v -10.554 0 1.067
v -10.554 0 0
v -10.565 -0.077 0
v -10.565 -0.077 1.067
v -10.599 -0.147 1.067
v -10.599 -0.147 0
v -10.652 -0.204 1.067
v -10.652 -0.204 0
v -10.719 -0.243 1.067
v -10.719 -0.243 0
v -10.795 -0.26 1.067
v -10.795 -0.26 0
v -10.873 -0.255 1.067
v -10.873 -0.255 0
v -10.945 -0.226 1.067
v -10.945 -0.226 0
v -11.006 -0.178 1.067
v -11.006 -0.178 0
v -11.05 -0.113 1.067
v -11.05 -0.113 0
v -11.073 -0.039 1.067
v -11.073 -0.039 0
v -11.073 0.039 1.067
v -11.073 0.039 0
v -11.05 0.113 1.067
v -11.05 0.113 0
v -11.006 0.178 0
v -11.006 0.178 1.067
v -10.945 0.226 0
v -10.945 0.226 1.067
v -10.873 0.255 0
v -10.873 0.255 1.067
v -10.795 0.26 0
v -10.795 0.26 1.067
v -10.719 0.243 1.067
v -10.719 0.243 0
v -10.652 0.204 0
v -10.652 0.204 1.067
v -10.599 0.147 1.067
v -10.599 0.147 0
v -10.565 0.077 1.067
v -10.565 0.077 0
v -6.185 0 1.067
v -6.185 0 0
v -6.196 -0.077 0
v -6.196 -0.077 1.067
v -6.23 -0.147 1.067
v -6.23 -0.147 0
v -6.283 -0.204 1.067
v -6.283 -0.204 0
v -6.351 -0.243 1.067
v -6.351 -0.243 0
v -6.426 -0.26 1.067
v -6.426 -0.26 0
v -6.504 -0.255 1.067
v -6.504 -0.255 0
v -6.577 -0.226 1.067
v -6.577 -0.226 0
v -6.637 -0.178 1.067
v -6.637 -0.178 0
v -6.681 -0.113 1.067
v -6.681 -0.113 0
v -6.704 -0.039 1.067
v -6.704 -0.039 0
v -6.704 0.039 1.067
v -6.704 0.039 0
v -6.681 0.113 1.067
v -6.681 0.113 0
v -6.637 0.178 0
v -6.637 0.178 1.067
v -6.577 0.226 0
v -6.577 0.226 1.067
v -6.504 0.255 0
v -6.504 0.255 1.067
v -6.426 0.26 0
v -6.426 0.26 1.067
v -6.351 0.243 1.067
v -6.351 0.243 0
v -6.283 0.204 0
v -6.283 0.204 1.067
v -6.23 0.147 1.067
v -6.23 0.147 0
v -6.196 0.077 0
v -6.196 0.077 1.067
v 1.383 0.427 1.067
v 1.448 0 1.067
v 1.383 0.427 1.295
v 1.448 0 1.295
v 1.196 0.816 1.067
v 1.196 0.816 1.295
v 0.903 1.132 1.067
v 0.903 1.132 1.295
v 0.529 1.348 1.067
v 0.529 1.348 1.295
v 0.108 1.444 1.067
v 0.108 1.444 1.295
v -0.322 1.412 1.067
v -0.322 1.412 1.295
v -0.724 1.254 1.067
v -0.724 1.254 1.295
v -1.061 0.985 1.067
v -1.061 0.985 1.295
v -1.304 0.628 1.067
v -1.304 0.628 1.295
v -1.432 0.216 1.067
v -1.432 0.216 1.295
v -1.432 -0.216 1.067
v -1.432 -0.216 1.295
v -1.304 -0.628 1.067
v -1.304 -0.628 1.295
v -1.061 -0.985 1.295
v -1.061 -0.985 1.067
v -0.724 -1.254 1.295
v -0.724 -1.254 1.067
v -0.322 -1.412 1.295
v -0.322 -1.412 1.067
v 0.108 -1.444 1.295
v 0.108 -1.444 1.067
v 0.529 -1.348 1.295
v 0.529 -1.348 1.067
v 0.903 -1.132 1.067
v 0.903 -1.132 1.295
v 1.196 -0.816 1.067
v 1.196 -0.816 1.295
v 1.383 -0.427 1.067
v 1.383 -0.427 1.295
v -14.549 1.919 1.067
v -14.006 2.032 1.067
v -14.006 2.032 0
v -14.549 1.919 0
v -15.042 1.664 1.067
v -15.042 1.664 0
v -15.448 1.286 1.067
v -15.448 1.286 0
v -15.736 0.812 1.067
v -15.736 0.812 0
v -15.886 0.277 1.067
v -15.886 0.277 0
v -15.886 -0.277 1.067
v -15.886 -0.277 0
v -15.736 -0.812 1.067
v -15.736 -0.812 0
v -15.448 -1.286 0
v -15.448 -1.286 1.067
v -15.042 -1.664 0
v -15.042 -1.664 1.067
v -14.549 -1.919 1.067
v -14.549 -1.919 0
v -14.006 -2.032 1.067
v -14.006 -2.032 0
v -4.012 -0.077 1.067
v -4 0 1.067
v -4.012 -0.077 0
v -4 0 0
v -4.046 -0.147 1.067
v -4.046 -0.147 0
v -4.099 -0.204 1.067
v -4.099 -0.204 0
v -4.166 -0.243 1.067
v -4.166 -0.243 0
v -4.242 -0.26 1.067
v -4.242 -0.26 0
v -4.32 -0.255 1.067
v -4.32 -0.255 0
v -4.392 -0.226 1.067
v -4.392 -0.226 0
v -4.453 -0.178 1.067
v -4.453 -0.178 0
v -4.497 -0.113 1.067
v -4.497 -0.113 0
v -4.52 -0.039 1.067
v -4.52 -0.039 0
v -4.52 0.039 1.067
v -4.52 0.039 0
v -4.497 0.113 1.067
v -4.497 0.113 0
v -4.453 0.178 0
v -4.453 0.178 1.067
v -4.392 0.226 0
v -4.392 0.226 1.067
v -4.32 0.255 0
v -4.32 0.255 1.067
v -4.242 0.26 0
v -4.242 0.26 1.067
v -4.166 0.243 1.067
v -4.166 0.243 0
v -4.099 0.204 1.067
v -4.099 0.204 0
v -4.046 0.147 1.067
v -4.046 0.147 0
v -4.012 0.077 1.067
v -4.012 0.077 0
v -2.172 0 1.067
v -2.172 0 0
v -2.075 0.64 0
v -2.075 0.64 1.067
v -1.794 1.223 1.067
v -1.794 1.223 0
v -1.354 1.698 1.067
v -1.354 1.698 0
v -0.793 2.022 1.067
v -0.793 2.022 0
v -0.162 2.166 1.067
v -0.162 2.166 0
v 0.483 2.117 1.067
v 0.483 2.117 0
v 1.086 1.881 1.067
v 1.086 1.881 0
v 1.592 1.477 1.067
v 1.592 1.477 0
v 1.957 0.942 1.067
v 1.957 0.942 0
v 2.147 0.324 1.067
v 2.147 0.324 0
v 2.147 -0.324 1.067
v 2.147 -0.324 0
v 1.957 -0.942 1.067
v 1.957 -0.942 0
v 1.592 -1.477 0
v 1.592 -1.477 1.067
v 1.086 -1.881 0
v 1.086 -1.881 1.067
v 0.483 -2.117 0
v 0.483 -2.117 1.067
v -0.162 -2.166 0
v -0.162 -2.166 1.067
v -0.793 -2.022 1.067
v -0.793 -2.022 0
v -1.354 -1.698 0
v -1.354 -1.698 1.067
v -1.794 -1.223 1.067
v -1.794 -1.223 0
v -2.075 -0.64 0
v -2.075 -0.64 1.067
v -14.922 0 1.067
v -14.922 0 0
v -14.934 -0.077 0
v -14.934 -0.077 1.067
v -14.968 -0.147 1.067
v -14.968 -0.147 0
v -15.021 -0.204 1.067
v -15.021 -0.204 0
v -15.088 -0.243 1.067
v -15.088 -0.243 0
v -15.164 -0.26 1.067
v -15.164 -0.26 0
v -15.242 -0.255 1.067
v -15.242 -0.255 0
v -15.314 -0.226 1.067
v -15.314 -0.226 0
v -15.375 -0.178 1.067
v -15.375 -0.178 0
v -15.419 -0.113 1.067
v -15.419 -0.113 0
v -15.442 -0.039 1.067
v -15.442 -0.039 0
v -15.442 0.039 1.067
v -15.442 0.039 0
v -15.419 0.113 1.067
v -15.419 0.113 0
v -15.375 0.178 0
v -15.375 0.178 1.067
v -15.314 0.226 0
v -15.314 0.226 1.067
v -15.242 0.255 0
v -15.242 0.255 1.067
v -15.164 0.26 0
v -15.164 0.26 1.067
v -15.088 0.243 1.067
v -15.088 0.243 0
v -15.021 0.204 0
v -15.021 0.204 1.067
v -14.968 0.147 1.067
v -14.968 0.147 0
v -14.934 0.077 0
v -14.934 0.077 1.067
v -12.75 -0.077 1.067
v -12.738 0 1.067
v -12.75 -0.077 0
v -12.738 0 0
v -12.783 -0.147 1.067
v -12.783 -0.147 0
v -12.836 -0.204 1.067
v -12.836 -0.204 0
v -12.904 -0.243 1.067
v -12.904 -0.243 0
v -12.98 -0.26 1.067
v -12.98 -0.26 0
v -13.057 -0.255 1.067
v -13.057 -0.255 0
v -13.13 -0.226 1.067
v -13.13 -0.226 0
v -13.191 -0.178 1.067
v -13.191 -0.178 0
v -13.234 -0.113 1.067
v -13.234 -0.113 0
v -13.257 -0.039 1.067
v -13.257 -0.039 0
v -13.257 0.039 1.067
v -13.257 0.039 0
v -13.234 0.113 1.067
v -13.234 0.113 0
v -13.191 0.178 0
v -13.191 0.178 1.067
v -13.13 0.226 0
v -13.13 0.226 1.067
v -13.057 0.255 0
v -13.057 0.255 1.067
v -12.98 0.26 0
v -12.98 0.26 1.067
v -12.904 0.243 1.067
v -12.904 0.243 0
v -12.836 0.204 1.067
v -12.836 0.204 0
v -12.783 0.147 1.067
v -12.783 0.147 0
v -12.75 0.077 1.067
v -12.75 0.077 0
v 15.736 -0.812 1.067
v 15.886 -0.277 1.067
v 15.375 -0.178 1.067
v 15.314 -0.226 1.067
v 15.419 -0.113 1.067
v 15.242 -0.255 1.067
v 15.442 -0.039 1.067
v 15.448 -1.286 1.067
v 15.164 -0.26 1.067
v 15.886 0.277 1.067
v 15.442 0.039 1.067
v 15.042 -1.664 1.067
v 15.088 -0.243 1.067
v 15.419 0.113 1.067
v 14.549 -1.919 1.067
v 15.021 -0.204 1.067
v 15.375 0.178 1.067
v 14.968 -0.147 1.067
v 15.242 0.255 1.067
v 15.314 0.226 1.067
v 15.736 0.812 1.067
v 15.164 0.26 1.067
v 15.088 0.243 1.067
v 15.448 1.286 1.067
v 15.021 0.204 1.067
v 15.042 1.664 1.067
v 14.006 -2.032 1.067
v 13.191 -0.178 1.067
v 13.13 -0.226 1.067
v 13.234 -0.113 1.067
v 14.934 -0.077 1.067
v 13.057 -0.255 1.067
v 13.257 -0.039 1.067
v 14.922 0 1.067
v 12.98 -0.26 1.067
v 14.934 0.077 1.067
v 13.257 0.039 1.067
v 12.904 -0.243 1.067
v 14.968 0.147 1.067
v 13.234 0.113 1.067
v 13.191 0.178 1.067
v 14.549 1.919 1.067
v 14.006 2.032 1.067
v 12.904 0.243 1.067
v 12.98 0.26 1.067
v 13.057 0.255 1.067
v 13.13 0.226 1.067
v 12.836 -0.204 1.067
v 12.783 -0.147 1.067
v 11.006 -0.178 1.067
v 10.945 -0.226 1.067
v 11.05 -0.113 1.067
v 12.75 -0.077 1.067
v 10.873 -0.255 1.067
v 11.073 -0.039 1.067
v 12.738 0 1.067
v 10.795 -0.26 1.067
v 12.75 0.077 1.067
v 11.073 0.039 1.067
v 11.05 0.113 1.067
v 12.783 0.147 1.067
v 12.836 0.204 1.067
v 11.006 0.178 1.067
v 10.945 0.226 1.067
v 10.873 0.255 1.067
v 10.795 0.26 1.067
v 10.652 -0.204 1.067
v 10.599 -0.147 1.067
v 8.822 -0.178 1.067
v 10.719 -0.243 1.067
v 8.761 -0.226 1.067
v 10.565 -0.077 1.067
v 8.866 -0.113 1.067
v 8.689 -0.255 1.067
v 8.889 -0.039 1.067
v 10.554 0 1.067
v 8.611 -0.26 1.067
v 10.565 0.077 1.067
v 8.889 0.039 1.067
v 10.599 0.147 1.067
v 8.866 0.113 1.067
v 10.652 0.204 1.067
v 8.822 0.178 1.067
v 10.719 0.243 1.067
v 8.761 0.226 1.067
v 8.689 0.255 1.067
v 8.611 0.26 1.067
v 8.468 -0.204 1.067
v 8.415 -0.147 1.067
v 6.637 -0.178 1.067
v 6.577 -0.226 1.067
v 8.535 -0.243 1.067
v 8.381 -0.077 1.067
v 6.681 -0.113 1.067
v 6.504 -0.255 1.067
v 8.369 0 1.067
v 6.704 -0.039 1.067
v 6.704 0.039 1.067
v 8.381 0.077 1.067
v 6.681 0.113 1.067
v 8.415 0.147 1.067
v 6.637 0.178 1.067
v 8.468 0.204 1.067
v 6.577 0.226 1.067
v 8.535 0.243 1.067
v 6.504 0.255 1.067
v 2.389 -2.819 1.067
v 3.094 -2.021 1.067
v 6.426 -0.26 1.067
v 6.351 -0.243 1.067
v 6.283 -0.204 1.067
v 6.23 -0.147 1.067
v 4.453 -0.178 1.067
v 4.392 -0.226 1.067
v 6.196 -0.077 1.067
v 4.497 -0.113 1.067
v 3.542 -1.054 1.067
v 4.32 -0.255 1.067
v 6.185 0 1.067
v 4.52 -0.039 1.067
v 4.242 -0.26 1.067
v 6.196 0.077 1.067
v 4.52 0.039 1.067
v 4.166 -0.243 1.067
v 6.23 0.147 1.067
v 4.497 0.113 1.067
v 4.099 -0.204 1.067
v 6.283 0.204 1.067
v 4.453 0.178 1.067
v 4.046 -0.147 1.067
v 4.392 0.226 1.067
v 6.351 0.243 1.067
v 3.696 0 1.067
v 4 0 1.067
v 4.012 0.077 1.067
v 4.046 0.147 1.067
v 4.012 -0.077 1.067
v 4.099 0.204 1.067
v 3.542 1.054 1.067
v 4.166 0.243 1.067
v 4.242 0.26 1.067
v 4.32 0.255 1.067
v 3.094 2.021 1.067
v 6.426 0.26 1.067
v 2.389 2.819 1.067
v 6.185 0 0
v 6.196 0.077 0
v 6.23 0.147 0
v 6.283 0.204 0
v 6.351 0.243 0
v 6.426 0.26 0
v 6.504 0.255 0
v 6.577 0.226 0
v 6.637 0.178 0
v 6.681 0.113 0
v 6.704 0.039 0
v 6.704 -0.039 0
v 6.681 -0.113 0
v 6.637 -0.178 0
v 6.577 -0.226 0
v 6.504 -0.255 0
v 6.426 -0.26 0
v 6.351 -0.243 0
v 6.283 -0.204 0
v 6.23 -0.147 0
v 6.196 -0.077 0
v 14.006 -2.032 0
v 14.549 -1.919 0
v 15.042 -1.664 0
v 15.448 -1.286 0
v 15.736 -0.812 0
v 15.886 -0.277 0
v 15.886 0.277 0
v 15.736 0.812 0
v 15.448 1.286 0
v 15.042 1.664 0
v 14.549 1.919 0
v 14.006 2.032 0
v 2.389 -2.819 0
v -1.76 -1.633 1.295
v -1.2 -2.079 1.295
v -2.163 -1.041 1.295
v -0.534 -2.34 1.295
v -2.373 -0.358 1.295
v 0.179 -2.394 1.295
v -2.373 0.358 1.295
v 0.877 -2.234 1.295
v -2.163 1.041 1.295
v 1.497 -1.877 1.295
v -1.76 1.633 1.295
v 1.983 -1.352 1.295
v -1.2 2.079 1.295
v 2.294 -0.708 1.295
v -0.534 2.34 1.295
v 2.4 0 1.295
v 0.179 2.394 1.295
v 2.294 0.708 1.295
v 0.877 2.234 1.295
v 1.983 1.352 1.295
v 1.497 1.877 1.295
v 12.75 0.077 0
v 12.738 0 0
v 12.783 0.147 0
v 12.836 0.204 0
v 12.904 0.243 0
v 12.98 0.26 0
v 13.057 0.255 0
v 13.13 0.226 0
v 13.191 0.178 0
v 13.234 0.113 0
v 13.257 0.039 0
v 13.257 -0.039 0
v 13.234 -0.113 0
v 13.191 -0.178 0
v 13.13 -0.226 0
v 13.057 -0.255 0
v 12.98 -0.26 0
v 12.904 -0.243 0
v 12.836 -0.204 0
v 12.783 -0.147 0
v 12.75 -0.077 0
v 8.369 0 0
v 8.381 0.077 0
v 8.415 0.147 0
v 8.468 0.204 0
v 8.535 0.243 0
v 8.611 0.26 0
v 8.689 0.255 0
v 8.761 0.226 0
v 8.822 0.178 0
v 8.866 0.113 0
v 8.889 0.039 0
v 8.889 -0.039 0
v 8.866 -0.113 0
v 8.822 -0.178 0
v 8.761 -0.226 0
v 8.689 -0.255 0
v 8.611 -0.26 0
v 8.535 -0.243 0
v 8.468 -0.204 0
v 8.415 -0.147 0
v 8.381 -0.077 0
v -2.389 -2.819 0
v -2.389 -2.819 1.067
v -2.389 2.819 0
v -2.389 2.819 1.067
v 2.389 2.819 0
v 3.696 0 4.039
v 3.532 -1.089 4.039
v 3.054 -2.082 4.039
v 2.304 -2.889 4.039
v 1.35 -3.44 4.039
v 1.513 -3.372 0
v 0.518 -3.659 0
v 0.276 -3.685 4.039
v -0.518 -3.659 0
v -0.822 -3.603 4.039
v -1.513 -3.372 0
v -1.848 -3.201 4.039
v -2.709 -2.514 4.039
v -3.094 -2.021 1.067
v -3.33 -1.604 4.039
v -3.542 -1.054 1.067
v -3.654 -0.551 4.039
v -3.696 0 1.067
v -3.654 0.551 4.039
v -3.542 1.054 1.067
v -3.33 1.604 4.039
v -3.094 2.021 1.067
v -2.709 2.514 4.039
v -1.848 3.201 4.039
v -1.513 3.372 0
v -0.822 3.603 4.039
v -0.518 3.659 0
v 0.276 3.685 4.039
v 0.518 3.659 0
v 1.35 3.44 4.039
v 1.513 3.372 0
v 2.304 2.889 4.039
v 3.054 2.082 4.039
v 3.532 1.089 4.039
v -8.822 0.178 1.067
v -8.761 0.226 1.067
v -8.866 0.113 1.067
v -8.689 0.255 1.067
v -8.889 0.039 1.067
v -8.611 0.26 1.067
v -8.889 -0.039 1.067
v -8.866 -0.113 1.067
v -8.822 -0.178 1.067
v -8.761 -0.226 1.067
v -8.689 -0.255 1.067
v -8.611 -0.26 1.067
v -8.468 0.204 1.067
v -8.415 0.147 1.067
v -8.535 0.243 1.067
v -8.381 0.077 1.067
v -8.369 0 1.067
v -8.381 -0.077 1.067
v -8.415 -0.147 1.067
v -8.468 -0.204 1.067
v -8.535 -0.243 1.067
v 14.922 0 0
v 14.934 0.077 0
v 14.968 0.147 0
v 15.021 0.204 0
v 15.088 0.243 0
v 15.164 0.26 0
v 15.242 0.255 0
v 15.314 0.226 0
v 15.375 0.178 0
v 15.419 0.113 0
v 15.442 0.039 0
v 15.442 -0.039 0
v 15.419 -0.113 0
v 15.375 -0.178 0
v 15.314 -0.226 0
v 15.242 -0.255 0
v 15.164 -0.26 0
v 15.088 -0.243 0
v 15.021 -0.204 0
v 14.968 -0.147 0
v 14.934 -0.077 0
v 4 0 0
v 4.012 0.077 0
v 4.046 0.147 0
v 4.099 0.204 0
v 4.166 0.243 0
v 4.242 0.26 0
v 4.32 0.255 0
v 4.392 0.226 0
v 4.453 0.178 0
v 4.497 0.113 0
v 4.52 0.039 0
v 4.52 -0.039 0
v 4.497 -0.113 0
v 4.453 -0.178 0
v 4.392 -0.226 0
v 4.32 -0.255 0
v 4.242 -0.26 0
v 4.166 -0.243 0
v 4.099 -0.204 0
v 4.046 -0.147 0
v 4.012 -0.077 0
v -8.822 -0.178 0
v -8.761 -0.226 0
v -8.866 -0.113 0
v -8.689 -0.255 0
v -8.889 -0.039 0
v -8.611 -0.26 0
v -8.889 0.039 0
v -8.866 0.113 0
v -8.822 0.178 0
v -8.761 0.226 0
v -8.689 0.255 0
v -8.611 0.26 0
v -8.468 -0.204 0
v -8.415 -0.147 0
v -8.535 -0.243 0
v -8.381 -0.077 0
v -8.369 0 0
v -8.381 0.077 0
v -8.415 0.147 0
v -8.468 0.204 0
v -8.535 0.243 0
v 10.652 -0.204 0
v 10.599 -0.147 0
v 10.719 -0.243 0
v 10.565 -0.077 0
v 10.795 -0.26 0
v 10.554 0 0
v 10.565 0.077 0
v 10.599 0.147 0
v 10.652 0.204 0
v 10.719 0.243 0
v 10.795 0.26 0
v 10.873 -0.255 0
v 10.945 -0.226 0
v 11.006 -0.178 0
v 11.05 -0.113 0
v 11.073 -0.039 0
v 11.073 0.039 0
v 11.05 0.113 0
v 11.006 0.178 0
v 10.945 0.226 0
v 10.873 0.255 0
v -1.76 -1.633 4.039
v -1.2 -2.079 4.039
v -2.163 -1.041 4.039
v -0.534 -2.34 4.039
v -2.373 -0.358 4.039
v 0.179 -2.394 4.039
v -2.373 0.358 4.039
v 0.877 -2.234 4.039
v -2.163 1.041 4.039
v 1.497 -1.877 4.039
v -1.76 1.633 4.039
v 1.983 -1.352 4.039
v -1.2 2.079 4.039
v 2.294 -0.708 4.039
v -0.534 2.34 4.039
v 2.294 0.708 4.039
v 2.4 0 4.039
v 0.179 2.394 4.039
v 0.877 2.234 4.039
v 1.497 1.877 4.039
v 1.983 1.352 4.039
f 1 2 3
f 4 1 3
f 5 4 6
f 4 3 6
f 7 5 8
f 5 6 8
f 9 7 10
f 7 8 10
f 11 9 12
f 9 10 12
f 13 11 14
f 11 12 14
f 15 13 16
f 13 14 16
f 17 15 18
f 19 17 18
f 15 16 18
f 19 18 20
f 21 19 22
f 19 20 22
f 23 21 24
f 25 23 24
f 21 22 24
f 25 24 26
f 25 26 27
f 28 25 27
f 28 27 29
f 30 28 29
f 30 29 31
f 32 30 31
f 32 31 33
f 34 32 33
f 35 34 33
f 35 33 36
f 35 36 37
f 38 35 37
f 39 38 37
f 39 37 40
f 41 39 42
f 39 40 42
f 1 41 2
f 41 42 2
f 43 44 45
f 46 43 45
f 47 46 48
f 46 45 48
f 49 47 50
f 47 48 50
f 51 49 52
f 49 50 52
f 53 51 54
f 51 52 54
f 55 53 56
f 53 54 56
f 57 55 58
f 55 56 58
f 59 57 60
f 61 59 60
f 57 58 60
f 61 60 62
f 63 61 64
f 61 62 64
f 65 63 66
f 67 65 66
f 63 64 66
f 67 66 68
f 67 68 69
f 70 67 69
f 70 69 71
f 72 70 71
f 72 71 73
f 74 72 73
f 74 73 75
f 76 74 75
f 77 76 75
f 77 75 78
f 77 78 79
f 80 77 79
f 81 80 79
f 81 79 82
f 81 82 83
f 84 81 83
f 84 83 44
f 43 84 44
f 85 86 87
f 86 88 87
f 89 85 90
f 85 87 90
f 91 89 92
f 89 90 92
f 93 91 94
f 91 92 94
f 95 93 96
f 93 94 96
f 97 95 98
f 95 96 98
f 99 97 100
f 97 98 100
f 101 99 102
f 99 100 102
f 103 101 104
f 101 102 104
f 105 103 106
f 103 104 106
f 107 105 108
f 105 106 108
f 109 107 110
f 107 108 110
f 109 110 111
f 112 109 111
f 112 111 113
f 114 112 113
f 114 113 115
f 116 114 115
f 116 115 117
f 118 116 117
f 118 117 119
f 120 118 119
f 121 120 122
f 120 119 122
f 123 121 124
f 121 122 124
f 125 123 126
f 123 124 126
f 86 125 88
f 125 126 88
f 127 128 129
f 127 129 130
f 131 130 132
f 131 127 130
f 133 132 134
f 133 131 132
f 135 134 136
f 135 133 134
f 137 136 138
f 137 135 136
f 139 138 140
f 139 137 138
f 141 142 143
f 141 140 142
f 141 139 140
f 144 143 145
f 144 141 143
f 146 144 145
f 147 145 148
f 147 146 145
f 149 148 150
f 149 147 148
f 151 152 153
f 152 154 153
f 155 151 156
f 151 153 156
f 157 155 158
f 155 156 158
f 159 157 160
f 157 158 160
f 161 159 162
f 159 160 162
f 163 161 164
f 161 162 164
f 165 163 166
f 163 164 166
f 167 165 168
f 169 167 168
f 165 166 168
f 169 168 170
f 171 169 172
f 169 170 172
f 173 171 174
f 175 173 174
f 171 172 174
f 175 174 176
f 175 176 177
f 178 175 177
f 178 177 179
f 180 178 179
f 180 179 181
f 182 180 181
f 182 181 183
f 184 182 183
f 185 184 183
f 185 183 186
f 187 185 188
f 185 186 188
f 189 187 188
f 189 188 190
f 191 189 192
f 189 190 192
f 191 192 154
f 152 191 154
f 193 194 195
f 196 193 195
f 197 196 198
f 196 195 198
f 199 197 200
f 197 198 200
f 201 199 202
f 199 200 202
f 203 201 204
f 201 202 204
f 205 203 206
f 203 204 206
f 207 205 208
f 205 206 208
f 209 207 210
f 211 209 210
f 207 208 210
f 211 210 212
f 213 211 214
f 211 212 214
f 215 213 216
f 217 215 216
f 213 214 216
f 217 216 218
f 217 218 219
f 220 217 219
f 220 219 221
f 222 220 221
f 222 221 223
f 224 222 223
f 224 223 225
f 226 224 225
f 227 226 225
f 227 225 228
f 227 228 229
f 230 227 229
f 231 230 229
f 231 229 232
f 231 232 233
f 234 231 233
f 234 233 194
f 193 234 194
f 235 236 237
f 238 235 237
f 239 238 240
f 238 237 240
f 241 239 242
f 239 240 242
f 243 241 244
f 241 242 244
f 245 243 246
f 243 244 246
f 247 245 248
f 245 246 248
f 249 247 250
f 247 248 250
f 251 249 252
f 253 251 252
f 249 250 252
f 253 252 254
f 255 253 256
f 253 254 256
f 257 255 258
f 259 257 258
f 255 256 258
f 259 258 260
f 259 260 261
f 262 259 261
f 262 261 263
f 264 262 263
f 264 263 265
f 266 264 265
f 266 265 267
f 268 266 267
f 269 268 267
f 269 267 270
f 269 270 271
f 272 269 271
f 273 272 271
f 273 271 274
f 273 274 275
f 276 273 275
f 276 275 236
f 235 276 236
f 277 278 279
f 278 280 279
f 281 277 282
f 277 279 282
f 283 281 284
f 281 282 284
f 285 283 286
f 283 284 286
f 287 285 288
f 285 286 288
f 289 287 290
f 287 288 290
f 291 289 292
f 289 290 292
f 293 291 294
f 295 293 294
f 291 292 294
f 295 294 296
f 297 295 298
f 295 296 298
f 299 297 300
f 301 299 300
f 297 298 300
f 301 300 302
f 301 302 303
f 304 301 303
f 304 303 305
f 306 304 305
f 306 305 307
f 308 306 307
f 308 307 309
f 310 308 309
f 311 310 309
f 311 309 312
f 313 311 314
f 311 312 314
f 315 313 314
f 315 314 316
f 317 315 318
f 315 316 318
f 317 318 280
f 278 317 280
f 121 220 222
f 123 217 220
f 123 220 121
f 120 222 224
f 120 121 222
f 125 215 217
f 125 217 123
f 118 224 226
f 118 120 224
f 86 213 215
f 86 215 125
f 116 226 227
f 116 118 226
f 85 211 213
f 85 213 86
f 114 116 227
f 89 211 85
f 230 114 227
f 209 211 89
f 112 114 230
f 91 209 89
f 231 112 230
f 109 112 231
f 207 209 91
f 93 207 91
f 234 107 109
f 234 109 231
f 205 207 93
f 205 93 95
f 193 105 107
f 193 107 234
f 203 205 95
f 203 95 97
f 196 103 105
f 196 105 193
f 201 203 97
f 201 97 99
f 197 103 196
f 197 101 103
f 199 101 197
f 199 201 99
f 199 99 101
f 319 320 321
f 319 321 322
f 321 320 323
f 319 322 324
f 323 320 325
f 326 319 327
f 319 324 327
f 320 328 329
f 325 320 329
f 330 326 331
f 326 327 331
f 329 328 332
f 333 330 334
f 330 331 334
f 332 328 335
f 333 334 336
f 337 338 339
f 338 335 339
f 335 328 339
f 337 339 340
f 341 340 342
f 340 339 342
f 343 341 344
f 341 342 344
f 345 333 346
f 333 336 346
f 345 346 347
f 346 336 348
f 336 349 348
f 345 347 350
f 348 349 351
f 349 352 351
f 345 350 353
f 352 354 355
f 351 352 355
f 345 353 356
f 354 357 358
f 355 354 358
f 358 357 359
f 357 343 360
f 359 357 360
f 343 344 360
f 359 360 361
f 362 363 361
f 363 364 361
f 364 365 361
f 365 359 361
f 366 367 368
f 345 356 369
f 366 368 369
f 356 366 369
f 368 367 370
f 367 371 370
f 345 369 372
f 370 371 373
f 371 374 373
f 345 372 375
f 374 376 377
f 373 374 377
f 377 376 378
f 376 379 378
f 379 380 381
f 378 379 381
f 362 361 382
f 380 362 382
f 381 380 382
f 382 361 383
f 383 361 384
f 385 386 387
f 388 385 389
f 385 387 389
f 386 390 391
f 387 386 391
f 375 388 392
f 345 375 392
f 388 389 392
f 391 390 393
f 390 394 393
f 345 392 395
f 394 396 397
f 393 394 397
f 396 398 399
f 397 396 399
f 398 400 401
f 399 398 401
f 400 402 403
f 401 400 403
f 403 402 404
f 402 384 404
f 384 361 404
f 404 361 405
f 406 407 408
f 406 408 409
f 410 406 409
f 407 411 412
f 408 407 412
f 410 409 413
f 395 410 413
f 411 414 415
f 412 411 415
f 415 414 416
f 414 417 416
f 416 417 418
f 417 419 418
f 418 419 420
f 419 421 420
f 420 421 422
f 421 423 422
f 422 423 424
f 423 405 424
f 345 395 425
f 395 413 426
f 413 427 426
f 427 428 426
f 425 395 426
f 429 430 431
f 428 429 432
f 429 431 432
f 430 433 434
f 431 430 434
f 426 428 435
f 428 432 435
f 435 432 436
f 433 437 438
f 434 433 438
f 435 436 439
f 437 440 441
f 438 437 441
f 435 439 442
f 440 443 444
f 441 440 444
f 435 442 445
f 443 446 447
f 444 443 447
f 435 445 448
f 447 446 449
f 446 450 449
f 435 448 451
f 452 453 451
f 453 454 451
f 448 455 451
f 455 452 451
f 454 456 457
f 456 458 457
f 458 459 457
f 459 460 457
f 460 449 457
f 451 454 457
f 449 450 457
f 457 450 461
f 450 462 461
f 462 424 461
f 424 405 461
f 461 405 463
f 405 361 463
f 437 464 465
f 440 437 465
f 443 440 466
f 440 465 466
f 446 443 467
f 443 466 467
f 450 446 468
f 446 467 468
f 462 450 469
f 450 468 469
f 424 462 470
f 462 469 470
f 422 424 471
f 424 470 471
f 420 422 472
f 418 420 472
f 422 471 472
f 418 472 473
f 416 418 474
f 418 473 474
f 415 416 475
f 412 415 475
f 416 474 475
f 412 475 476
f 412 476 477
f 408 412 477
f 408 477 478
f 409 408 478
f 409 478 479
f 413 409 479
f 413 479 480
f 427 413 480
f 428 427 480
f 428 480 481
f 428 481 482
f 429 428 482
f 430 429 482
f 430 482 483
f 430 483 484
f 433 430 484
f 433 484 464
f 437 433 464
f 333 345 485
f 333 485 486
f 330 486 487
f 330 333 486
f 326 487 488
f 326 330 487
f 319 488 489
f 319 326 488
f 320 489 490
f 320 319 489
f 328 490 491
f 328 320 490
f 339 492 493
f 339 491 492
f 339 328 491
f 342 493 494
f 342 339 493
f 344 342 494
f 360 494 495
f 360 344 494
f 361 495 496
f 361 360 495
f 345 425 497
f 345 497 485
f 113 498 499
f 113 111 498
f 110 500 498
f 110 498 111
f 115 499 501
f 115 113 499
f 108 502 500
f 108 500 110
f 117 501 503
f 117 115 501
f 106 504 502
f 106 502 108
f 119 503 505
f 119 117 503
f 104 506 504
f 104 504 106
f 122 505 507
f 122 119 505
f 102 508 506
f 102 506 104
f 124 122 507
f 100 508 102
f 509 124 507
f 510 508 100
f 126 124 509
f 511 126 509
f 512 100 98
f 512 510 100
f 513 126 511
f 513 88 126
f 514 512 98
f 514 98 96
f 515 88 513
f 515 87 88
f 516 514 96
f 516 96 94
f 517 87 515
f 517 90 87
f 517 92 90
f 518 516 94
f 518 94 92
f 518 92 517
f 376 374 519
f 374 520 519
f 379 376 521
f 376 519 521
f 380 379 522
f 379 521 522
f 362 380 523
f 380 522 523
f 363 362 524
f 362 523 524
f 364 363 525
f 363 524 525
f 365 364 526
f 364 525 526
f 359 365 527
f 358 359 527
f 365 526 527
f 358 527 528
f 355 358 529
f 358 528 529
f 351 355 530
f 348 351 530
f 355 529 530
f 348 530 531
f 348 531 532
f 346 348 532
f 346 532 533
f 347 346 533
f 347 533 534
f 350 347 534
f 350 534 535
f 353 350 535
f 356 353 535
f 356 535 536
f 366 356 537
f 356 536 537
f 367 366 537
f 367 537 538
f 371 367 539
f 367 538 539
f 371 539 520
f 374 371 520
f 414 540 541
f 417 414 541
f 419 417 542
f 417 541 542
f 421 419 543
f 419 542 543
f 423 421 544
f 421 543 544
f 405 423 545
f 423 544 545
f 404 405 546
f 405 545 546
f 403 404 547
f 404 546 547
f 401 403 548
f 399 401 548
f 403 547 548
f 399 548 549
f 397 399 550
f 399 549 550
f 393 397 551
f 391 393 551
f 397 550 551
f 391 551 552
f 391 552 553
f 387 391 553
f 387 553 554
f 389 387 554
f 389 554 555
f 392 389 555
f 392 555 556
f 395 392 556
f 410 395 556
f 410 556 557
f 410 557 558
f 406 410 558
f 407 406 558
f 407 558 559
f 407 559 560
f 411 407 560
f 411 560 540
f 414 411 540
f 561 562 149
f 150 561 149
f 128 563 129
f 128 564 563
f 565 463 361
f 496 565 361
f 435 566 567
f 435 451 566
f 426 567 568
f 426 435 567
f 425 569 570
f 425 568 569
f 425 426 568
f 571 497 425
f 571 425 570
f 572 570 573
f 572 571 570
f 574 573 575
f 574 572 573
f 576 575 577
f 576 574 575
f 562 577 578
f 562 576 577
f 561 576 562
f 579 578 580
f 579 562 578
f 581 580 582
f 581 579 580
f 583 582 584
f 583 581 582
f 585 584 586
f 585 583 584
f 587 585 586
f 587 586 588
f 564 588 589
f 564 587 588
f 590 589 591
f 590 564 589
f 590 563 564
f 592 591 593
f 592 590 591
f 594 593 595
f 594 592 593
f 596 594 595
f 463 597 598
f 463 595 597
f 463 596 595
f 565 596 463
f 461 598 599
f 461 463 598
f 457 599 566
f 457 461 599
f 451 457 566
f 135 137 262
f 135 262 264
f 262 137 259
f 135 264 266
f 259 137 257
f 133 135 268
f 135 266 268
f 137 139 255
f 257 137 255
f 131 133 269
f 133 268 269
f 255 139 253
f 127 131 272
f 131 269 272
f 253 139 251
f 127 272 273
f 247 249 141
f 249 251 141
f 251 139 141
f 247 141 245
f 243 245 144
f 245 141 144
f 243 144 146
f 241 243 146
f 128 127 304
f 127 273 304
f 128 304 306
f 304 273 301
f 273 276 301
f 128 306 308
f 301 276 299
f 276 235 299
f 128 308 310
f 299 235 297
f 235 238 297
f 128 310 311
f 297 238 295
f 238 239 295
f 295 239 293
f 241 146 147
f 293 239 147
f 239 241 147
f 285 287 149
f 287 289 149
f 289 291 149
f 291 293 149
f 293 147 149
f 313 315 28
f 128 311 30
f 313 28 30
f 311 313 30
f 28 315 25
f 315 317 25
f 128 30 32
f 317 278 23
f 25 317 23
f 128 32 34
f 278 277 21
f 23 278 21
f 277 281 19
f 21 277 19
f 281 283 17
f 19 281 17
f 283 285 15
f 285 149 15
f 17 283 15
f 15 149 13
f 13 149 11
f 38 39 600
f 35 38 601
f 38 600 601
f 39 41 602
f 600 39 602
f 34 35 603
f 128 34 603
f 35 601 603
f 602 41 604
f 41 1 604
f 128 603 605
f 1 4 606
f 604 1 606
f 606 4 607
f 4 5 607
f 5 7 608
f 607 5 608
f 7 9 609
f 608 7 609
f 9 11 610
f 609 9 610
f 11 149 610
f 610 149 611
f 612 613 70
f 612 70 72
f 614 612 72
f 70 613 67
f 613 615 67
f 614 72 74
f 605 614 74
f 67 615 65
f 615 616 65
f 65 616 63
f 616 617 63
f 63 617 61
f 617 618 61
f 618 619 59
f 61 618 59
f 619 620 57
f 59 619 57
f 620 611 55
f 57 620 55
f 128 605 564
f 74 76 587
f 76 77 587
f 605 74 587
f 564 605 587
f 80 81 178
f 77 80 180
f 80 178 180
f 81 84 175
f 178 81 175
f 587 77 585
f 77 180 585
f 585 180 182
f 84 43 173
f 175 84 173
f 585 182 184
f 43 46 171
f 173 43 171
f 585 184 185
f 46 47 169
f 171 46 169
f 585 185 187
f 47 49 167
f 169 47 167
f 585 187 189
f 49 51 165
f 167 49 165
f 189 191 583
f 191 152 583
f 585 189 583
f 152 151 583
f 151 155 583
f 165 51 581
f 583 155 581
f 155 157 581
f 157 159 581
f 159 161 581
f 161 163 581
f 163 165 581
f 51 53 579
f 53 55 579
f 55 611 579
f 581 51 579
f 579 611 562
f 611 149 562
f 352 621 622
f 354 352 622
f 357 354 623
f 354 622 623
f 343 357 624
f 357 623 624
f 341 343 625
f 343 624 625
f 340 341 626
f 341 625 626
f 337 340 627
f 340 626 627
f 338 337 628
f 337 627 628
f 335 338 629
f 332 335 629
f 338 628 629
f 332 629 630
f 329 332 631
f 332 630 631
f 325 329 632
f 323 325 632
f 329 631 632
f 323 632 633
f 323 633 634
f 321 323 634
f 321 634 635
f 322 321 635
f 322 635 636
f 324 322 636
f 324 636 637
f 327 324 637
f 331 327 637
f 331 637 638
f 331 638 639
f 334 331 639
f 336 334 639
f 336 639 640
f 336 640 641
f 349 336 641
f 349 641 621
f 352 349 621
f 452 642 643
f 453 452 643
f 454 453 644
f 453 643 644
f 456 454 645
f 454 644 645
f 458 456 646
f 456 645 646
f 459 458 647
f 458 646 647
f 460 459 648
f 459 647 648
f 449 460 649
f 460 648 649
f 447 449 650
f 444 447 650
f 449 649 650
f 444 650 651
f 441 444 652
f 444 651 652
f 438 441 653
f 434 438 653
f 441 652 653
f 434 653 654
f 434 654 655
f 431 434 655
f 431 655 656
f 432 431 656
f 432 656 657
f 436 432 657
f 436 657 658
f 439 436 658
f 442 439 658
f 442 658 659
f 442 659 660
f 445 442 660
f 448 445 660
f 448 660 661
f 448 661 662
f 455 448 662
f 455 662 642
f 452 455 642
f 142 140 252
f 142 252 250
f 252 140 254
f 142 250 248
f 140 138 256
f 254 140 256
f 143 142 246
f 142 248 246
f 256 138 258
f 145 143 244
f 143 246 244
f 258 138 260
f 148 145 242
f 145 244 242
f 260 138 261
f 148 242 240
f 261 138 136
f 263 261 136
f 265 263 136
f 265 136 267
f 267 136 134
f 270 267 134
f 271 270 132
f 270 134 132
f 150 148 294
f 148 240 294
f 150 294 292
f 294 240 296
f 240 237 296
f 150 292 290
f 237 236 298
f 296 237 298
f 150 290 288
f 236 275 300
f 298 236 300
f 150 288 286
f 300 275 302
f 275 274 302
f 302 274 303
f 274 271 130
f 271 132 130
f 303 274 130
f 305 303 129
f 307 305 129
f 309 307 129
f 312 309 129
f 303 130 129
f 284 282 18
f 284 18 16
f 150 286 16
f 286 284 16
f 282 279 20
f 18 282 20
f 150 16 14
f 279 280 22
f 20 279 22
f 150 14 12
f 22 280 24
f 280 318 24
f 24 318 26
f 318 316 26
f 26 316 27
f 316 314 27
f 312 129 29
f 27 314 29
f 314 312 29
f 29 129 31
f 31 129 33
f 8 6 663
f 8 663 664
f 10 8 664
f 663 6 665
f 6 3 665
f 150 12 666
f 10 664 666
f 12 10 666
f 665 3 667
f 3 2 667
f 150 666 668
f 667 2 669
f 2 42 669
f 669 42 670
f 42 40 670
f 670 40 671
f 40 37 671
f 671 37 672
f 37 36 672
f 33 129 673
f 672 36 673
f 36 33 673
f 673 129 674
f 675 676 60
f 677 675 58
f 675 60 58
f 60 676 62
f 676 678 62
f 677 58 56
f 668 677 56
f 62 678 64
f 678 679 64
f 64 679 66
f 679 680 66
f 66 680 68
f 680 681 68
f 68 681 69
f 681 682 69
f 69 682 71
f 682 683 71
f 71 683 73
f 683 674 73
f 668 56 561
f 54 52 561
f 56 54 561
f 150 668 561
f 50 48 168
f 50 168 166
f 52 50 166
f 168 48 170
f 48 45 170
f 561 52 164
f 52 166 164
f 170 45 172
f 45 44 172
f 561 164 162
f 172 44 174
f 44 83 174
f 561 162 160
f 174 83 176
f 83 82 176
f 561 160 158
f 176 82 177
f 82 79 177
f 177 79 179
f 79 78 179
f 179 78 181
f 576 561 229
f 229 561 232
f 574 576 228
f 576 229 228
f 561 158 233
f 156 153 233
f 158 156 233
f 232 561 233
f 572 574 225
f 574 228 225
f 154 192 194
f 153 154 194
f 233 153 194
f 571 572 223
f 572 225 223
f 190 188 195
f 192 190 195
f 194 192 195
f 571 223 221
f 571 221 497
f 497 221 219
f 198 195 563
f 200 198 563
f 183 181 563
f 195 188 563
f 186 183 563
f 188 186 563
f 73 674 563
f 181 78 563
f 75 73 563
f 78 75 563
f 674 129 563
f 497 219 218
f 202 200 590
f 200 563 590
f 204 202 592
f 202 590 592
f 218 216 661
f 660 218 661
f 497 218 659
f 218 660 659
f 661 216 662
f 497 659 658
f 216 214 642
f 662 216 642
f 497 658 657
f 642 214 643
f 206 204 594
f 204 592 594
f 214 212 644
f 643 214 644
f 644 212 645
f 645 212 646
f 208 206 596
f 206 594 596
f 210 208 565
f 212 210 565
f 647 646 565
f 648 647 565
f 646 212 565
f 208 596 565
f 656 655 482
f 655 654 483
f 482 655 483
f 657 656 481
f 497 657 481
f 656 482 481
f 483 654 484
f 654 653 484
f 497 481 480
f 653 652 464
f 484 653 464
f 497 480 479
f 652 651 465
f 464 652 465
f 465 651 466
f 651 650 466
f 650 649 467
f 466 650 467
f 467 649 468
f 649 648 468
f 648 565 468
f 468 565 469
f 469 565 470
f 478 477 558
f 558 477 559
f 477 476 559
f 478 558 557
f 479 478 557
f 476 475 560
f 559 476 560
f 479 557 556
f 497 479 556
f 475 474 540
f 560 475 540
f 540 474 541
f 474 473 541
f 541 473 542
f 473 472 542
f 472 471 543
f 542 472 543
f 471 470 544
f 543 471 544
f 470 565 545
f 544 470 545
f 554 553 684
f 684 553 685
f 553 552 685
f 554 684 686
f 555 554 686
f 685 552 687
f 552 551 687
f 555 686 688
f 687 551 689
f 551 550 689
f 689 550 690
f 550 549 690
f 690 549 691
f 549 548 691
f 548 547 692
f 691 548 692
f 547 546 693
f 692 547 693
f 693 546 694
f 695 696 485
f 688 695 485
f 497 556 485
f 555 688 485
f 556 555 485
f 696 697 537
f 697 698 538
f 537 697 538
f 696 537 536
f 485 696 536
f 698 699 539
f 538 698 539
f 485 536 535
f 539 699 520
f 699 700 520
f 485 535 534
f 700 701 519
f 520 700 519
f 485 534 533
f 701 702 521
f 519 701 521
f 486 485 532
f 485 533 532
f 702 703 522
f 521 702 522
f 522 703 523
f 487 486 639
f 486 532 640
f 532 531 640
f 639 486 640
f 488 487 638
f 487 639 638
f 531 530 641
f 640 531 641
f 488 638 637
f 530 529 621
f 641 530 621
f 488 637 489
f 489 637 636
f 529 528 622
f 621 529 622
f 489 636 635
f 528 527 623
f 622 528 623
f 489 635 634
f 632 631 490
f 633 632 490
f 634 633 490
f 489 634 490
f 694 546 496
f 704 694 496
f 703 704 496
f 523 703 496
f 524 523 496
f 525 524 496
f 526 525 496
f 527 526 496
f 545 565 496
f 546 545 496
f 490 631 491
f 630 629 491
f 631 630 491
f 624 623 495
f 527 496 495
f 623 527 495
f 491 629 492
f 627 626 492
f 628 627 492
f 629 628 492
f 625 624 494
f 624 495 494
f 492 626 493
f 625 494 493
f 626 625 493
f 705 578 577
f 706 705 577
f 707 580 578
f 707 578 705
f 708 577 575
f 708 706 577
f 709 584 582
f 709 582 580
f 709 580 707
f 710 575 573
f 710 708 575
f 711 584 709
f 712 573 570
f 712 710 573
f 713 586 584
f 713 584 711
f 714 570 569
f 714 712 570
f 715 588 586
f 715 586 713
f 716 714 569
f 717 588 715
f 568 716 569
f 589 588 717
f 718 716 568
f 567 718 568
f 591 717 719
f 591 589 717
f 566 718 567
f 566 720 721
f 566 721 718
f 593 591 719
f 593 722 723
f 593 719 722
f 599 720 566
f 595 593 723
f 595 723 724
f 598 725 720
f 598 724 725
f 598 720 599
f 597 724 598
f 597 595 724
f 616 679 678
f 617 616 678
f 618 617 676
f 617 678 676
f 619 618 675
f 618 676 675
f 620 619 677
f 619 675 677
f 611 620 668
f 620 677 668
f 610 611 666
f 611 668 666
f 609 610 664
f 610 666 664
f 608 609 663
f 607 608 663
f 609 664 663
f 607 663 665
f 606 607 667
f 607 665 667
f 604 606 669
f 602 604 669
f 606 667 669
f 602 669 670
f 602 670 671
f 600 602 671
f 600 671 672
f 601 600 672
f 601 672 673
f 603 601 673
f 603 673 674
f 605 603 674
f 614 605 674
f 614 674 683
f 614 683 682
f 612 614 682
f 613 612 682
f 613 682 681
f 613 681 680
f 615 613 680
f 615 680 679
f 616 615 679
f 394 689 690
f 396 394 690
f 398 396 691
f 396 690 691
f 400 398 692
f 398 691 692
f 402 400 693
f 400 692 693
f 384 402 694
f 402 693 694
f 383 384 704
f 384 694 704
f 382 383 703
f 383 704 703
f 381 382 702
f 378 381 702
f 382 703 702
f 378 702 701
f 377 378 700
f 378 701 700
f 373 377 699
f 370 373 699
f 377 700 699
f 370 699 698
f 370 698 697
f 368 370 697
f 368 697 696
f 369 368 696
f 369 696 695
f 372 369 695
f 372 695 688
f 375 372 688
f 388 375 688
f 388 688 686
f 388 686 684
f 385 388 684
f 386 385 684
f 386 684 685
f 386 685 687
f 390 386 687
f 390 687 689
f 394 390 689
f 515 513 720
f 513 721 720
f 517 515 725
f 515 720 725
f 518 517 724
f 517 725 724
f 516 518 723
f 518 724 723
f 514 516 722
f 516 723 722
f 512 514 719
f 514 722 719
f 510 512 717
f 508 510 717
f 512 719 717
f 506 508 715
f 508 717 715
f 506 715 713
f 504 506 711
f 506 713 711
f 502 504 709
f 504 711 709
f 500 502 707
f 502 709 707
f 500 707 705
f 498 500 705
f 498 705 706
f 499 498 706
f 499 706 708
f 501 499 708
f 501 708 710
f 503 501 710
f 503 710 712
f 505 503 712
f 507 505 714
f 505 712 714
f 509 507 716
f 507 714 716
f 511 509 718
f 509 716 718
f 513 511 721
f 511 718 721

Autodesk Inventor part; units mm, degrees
ref_plane "YZ Plane" through (0, 0, 0) normal (1, 0, 0) x (0, 1, 0)
ref_plane "XZ Plane" through (0, 0, 0) normal (0, 1, 0) x (-1, 0, 0)
ref_plane "XY Plane" through (0, 0, 0) normal (0, 0, 1) x (1, 0, 0)
sketch "Sketch1" plane through (0, 0, 0) normal (0, 0, 1) x (1, 0, 0)
  circle A0 centre (0, 0) radius 3.6957
  dimension "d0" = 7.3914
extrude "Extrusion1" add sketch "Sketch1" along normal blind 4.0386
sketch "Sketch2" plane through (0, 0, 4.0386) normal (0, 0, 1) x (1, 0, 0)
  circle A0 centre (0, 0) radius 3.6957 projected
  circle A1 centre (0, 0) radius 2.4003
  dimension "d3" = 1.2954
extrude "Extrusion2" cut sketch "Sketch2" against normal blind 2.7432 contours A1
sketch "Sketch3" plane through (0, 0, 0) normal (0, 0, -1) x (-1, 0, 0)
  circle A0 centre (0, 0) radius 3.6957 projected
  circle A1 centre (0, 0) radius 2.1717
  dimension "d6" = 1.524
extrude "Extrusion3" cut sketch "Sketch3" against normal blind 1.0668 contours A1
sketch "Sketch4" plane through (0, 0, 1.2954) normal (0, 0, 1) x (1, 0, 0)
  circle A0 centre (0, 0) radius 2.4003 projected
  circle A1 centre (0, 0) radius 1.4478
  dimension "d9" = 2.8956
extrude "Extrusion4" cut sketch "Sketch4" against normal through all contours A1
ref_plane "Work Plane1" through (0, 0, 0.5334) normal (0, 0, -1) x (-1, 0, 0)
sketch "Sketch5" plane through (0, 0, 0.5334) normal (0, 0, -1) x (-1, 0, 0)
  circle A0 centre (0, 0) radius 3.6957 projected
  line L0 (-2.3894, 2.8194) -> (-14.0061, 2.032)
  line L1 (-2.3894, -2.8194) -> (-14.0061, -2.032)
  arc A1 (-14.0061, 2.032) -> (-14.0061, -2.032) centre (-13.8684, 0) ccw
  circle A2 centre (0, 0) radius 2.4003 projected
  line L2 (2.3894, 2.8194) -> (14.0061, 2.032)
  arc A3 (14.0061, -2.032) -> (14.0061, 2.032) centre (13.8684, 0) ccw
  line L3 (2.3894, -2.8194) -> (14.0061, -2.032)
  dimension "d12" = 5.6388
  dimension "d13" = 4.064
  dimension "d15" = 13.8684
  dimension "d28" = 360
extrude "Extrusion5" add sketch "Sketch5" along normal mid plane 1.0668 contours A0 L1 A1 L0
sketch "Sketch6" plane through (0, 0, 0) normal (0, 0, -1) x (-1, 0, 0)
  circle A0 centre (0, 0) radius 2.1717 projected
  circle A1 centre (-15.1836, 0) radius 0.2611
  circle A2 centre (-12.9992, 0) radius 0.2611
  circle A3 centre (-10.8148, 0) radius 0.2611
  circle A4 centre (-8.6304, 0) radius 0.2611
  circle A5 centre (-6.446, 0) radius 0.2611
  circle A6 centre (-4.2616, 0) radius 0.2611
  dimension "d18" = 1.8288
  dimension "d19" = 4.0132
  dimension "d20" = 2.1844
  dimension "d21" = 2.1844
  dimension "d22" = 2.1844
  dimension "d23" = 2.1844
extrude "Extrusion6" cut sketch "Sketch6" against normal through all contours A1 | A2 | A3 | A4 | A5 | A6
pattern_circular "Circular Pattern1" count 2 over 360 about axis through (0, 0, 0) along (0, 0, 1) of "Extrusion5", "Extrusion6"
properties part number "Servo Horn"
